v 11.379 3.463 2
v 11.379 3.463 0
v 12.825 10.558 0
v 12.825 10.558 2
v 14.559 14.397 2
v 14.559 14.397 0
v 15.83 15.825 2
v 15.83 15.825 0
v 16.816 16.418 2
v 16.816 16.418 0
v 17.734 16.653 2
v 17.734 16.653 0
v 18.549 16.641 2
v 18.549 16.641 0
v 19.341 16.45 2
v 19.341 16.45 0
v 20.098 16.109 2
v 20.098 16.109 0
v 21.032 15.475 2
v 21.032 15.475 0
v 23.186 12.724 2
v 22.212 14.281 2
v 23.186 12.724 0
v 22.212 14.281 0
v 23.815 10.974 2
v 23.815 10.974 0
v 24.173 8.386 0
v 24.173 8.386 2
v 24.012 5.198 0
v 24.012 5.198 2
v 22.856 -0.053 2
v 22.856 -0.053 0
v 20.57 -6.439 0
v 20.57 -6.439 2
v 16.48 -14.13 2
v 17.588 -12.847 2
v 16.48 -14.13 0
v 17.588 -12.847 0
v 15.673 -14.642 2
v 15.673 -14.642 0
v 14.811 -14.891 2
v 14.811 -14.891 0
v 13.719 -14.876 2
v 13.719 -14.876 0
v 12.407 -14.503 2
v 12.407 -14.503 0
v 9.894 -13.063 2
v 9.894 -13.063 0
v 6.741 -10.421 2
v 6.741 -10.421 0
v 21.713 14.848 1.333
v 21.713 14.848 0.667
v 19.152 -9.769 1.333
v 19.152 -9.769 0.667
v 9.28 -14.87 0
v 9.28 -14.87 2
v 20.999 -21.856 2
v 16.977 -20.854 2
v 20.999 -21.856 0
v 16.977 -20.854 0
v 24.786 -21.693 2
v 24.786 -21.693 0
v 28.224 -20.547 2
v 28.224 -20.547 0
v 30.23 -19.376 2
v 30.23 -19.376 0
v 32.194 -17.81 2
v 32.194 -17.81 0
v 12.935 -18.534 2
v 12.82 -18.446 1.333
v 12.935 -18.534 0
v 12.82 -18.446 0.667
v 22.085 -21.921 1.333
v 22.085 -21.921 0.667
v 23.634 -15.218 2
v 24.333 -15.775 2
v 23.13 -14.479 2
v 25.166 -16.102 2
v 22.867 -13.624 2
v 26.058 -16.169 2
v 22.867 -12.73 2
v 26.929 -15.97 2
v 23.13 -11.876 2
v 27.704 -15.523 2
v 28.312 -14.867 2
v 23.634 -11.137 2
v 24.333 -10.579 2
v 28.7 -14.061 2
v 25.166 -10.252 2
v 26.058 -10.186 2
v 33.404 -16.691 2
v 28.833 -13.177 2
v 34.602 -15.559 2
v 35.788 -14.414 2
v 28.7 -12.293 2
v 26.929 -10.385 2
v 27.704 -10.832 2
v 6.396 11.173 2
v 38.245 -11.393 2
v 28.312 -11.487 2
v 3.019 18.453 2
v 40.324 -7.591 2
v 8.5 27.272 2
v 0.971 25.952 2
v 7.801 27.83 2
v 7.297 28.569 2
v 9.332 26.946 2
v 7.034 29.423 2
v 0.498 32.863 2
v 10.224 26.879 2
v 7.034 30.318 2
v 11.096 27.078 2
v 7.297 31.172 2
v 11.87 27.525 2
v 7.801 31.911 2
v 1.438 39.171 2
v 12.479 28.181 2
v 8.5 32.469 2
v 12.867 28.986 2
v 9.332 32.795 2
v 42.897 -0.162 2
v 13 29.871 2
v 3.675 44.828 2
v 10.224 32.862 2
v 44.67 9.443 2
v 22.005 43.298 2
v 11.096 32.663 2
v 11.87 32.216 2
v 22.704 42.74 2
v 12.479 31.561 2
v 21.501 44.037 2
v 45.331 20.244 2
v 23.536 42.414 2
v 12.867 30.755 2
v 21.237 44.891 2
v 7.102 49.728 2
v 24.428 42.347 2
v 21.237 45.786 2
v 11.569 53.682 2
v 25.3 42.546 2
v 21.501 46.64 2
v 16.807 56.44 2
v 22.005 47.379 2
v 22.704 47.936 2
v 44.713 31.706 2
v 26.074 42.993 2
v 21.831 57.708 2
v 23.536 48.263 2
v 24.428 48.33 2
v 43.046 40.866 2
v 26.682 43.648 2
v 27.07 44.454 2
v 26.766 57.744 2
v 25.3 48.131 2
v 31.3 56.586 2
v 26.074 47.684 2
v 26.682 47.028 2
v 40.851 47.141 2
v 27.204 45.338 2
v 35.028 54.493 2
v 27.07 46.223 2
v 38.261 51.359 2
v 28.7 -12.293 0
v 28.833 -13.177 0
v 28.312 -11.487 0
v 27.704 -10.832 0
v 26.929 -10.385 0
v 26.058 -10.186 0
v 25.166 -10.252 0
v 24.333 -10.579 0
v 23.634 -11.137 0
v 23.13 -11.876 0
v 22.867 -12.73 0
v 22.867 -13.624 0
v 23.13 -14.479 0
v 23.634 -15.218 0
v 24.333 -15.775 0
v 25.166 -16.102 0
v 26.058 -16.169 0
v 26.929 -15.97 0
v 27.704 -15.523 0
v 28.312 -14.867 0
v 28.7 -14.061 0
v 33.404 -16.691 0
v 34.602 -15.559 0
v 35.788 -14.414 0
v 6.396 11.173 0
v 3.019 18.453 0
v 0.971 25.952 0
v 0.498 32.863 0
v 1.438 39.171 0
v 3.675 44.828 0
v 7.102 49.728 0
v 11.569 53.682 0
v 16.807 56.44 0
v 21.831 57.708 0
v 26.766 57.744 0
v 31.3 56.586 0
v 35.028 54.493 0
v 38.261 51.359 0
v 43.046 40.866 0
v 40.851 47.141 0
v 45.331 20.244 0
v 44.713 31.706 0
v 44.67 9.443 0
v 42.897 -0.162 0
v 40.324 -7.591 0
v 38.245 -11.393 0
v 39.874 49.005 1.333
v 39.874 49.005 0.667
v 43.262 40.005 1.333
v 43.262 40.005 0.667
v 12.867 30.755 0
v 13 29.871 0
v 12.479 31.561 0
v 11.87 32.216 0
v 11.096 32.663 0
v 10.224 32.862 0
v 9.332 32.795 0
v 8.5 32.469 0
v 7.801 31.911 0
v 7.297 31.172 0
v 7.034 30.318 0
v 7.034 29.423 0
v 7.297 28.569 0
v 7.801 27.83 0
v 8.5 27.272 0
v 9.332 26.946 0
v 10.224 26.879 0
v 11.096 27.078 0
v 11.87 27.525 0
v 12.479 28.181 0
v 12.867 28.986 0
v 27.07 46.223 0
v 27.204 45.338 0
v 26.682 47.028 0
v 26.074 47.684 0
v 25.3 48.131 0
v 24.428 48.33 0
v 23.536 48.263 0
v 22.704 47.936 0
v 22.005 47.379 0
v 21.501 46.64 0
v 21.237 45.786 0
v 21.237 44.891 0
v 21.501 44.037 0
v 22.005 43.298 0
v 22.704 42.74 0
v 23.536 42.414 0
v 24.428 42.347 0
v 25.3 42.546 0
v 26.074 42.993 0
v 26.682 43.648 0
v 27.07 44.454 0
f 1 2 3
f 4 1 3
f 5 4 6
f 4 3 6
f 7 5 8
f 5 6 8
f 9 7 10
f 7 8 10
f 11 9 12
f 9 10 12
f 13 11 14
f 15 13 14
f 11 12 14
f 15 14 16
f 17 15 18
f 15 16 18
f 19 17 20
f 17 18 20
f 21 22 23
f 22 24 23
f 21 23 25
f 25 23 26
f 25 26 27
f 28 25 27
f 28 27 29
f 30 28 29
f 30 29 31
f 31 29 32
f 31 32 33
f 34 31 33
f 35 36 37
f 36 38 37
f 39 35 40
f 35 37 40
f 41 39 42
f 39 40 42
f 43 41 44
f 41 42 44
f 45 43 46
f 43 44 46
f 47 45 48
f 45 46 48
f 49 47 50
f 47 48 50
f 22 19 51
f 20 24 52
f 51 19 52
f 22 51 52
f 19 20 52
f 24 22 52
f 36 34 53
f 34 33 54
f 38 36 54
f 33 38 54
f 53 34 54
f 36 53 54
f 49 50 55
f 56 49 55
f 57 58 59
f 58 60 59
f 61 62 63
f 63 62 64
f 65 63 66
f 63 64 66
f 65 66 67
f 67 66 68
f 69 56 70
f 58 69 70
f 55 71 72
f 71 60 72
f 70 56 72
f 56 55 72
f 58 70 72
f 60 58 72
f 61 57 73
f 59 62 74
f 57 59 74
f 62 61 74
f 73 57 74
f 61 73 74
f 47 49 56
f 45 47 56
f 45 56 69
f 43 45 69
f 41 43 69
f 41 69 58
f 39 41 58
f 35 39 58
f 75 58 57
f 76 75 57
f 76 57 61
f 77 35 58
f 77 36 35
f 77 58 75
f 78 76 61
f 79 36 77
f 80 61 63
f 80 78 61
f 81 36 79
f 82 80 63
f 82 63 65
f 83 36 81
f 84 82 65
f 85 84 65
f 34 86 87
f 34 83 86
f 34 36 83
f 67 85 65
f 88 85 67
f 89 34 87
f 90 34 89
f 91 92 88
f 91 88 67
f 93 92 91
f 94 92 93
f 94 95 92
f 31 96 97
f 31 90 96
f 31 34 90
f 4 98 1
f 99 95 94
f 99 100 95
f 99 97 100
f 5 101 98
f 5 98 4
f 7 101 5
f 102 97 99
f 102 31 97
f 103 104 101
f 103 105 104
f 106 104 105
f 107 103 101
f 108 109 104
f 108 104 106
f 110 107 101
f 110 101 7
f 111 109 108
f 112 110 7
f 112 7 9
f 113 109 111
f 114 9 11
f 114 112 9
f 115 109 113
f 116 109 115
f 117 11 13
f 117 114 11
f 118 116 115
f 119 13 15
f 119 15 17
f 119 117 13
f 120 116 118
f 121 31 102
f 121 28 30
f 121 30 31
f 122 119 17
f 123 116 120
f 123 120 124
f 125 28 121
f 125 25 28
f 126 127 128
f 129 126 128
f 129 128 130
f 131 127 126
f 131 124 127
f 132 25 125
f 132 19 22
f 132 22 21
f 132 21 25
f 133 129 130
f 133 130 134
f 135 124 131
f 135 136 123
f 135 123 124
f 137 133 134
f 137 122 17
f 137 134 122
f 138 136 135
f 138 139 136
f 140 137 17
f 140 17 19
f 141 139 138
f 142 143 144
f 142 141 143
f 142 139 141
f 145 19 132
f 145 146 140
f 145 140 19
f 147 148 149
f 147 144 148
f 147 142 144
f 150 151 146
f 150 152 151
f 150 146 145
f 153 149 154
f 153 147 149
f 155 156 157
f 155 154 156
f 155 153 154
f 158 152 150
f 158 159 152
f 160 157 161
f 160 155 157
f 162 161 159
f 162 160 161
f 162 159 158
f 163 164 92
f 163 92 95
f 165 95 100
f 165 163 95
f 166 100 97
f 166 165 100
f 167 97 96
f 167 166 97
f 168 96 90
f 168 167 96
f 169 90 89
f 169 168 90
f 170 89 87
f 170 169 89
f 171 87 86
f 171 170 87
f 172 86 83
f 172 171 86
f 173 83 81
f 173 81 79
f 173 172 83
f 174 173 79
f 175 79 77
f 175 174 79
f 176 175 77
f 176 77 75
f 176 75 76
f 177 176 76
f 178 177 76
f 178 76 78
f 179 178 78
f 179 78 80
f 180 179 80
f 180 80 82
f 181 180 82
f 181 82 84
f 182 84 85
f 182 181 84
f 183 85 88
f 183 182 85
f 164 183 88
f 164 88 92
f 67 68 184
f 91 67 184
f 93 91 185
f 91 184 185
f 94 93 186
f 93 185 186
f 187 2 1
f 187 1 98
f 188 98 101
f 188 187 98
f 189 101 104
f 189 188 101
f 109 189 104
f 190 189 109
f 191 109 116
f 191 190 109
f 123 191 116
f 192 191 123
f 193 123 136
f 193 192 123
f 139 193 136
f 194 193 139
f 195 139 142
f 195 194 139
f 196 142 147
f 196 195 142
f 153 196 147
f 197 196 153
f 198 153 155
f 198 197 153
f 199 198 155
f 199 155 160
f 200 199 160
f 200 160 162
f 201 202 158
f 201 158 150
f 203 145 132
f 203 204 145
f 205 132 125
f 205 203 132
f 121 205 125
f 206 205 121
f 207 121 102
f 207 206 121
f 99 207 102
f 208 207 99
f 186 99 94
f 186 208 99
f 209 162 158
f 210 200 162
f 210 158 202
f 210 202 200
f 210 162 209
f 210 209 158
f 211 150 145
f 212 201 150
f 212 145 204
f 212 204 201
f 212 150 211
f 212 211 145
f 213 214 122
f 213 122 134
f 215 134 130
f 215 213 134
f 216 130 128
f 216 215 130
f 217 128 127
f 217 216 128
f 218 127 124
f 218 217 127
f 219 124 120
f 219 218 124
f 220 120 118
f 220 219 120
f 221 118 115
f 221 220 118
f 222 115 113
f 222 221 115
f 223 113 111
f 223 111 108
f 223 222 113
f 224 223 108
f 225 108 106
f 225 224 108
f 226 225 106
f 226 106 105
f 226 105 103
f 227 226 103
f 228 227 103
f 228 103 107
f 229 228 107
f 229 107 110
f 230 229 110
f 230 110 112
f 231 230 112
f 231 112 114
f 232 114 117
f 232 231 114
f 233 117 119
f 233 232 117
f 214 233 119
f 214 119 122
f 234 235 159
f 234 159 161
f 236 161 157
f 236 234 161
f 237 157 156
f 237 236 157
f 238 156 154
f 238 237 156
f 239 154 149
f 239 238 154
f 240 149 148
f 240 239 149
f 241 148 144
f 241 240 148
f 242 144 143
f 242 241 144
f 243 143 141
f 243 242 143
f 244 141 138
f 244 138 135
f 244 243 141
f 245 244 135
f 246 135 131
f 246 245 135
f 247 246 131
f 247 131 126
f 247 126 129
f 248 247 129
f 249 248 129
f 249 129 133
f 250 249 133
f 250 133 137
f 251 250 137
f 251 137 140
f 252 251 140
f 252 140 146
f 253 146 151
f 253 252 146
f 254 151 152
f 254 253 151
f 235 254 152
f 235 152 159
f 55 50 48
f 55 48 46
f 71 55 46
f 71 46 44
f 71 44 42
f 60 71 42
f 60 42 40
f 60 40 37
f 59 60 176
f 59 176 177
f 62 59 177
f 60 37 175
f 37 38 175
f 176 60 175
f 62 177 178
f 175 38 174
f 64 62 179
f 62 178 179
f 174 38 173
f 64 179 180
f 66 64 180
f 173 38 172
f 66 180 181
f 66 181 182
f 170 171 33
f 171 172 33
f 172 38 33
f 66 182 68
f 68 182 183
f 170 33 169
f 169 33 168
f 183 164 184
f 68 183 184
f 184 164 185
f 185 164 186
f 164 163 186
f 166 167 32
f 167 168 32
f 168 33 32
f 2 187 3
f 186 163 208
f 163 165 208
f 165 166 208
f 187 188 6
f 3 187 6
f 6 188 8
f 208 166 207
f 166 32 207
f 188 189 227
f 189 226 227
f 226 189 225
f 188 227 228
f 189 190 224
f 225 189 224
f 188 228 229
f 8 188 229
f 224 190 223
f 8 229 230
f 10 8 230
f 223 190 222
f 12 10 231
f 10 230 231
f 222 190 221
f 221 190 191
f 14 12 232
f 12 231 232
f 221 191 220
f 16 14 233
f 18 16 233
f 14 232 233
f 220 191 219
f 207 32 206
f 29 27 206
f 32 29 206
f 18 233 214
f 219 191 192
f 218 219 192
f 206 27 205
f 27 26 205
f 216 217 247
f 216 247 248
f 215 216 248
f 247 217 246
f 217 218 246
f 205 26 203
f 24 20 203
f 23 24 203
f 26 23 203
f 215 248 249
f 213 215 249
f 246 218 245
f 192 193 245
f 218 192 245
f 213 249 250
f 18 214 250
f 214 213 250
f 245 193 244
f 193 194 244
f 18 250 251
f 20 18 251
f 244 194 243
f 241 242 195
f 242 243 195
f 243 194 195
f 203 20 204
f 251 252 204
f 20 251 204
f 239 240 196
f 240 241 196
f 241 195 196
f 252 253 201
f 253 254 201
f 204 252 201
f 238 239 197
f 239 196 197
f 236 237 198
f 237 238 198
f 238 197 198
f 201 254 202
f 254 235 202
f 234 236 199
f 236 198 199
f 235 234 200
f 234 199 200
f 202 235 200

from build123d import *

# Parameters (mm, degrees)
SKETCH1_R           = 3
BOSS_EXTRUDE1_DEPTH = 2


with BuildPart() as part:
    # Sketch1 → Boss-Extrude1 (new body)
    with BuildSketch(Plane.XY):
        with BuildLine():
            ThreePointArc((32.19406205, -17.810203093), (34.004806039, -16.126941486), (35.787561743, -14.414065094))
            add(Edge.make_bspline(
                [(11.378973774, 3.463257982), (-20.428079659, 46.561414382), (31.035983519, 75.262771907), (47.834715517, 28.357171922), (45.468507141, -4.957929113), (35.787561743, -14.414065094)],
                knots=[0, 0, 0, 0, 0.599100037, 0.662517606, 0.977567835, 0.977567835, 0.977567835, 0.977567835], degree=3))
            add(Edge.make_bspline(
                [(11.378973774, 3.463257982), (13.365800423, 19.100858267), (28.926423979, 15.35029216), (21.063971919, -6.395817412), (15.153515843, -18.353465234), (6.741063931, -10.420697396)],
                knots=[0, 0, 0, 0, 0.26677765, 0.750922652, 1, 1, 1, 1], degree=3))
            add(Edge.make_bspline(
                [(6.741063931, -10.420697396), (10.445950674, -19.708893243), (22.444364812, -26.724844927), (32.19406205, -17.810203093)],
                knots=[0, 0, 0, 0, 0.946117245, 0.946117245, 0.946117245, 0.946117245], degree=3))
        make_face()
        with Locations((24.20370128, 45.338419783)):
            Circle(SKETCH1_R, mode=Mode.SUBTRACT)
        with Locations((10, 29.870554062)):
            Circle(SKETCH1_R, mode=Mode.SUBTRACT)
        with Locations((25.833353061, -13.177172292)):
            Circle(SKETCH1_R, mode=Mode.SUBTRACT)
    extrude(amount=BOSS_EXTRUDE1_DEPTH)


solid = part.part
